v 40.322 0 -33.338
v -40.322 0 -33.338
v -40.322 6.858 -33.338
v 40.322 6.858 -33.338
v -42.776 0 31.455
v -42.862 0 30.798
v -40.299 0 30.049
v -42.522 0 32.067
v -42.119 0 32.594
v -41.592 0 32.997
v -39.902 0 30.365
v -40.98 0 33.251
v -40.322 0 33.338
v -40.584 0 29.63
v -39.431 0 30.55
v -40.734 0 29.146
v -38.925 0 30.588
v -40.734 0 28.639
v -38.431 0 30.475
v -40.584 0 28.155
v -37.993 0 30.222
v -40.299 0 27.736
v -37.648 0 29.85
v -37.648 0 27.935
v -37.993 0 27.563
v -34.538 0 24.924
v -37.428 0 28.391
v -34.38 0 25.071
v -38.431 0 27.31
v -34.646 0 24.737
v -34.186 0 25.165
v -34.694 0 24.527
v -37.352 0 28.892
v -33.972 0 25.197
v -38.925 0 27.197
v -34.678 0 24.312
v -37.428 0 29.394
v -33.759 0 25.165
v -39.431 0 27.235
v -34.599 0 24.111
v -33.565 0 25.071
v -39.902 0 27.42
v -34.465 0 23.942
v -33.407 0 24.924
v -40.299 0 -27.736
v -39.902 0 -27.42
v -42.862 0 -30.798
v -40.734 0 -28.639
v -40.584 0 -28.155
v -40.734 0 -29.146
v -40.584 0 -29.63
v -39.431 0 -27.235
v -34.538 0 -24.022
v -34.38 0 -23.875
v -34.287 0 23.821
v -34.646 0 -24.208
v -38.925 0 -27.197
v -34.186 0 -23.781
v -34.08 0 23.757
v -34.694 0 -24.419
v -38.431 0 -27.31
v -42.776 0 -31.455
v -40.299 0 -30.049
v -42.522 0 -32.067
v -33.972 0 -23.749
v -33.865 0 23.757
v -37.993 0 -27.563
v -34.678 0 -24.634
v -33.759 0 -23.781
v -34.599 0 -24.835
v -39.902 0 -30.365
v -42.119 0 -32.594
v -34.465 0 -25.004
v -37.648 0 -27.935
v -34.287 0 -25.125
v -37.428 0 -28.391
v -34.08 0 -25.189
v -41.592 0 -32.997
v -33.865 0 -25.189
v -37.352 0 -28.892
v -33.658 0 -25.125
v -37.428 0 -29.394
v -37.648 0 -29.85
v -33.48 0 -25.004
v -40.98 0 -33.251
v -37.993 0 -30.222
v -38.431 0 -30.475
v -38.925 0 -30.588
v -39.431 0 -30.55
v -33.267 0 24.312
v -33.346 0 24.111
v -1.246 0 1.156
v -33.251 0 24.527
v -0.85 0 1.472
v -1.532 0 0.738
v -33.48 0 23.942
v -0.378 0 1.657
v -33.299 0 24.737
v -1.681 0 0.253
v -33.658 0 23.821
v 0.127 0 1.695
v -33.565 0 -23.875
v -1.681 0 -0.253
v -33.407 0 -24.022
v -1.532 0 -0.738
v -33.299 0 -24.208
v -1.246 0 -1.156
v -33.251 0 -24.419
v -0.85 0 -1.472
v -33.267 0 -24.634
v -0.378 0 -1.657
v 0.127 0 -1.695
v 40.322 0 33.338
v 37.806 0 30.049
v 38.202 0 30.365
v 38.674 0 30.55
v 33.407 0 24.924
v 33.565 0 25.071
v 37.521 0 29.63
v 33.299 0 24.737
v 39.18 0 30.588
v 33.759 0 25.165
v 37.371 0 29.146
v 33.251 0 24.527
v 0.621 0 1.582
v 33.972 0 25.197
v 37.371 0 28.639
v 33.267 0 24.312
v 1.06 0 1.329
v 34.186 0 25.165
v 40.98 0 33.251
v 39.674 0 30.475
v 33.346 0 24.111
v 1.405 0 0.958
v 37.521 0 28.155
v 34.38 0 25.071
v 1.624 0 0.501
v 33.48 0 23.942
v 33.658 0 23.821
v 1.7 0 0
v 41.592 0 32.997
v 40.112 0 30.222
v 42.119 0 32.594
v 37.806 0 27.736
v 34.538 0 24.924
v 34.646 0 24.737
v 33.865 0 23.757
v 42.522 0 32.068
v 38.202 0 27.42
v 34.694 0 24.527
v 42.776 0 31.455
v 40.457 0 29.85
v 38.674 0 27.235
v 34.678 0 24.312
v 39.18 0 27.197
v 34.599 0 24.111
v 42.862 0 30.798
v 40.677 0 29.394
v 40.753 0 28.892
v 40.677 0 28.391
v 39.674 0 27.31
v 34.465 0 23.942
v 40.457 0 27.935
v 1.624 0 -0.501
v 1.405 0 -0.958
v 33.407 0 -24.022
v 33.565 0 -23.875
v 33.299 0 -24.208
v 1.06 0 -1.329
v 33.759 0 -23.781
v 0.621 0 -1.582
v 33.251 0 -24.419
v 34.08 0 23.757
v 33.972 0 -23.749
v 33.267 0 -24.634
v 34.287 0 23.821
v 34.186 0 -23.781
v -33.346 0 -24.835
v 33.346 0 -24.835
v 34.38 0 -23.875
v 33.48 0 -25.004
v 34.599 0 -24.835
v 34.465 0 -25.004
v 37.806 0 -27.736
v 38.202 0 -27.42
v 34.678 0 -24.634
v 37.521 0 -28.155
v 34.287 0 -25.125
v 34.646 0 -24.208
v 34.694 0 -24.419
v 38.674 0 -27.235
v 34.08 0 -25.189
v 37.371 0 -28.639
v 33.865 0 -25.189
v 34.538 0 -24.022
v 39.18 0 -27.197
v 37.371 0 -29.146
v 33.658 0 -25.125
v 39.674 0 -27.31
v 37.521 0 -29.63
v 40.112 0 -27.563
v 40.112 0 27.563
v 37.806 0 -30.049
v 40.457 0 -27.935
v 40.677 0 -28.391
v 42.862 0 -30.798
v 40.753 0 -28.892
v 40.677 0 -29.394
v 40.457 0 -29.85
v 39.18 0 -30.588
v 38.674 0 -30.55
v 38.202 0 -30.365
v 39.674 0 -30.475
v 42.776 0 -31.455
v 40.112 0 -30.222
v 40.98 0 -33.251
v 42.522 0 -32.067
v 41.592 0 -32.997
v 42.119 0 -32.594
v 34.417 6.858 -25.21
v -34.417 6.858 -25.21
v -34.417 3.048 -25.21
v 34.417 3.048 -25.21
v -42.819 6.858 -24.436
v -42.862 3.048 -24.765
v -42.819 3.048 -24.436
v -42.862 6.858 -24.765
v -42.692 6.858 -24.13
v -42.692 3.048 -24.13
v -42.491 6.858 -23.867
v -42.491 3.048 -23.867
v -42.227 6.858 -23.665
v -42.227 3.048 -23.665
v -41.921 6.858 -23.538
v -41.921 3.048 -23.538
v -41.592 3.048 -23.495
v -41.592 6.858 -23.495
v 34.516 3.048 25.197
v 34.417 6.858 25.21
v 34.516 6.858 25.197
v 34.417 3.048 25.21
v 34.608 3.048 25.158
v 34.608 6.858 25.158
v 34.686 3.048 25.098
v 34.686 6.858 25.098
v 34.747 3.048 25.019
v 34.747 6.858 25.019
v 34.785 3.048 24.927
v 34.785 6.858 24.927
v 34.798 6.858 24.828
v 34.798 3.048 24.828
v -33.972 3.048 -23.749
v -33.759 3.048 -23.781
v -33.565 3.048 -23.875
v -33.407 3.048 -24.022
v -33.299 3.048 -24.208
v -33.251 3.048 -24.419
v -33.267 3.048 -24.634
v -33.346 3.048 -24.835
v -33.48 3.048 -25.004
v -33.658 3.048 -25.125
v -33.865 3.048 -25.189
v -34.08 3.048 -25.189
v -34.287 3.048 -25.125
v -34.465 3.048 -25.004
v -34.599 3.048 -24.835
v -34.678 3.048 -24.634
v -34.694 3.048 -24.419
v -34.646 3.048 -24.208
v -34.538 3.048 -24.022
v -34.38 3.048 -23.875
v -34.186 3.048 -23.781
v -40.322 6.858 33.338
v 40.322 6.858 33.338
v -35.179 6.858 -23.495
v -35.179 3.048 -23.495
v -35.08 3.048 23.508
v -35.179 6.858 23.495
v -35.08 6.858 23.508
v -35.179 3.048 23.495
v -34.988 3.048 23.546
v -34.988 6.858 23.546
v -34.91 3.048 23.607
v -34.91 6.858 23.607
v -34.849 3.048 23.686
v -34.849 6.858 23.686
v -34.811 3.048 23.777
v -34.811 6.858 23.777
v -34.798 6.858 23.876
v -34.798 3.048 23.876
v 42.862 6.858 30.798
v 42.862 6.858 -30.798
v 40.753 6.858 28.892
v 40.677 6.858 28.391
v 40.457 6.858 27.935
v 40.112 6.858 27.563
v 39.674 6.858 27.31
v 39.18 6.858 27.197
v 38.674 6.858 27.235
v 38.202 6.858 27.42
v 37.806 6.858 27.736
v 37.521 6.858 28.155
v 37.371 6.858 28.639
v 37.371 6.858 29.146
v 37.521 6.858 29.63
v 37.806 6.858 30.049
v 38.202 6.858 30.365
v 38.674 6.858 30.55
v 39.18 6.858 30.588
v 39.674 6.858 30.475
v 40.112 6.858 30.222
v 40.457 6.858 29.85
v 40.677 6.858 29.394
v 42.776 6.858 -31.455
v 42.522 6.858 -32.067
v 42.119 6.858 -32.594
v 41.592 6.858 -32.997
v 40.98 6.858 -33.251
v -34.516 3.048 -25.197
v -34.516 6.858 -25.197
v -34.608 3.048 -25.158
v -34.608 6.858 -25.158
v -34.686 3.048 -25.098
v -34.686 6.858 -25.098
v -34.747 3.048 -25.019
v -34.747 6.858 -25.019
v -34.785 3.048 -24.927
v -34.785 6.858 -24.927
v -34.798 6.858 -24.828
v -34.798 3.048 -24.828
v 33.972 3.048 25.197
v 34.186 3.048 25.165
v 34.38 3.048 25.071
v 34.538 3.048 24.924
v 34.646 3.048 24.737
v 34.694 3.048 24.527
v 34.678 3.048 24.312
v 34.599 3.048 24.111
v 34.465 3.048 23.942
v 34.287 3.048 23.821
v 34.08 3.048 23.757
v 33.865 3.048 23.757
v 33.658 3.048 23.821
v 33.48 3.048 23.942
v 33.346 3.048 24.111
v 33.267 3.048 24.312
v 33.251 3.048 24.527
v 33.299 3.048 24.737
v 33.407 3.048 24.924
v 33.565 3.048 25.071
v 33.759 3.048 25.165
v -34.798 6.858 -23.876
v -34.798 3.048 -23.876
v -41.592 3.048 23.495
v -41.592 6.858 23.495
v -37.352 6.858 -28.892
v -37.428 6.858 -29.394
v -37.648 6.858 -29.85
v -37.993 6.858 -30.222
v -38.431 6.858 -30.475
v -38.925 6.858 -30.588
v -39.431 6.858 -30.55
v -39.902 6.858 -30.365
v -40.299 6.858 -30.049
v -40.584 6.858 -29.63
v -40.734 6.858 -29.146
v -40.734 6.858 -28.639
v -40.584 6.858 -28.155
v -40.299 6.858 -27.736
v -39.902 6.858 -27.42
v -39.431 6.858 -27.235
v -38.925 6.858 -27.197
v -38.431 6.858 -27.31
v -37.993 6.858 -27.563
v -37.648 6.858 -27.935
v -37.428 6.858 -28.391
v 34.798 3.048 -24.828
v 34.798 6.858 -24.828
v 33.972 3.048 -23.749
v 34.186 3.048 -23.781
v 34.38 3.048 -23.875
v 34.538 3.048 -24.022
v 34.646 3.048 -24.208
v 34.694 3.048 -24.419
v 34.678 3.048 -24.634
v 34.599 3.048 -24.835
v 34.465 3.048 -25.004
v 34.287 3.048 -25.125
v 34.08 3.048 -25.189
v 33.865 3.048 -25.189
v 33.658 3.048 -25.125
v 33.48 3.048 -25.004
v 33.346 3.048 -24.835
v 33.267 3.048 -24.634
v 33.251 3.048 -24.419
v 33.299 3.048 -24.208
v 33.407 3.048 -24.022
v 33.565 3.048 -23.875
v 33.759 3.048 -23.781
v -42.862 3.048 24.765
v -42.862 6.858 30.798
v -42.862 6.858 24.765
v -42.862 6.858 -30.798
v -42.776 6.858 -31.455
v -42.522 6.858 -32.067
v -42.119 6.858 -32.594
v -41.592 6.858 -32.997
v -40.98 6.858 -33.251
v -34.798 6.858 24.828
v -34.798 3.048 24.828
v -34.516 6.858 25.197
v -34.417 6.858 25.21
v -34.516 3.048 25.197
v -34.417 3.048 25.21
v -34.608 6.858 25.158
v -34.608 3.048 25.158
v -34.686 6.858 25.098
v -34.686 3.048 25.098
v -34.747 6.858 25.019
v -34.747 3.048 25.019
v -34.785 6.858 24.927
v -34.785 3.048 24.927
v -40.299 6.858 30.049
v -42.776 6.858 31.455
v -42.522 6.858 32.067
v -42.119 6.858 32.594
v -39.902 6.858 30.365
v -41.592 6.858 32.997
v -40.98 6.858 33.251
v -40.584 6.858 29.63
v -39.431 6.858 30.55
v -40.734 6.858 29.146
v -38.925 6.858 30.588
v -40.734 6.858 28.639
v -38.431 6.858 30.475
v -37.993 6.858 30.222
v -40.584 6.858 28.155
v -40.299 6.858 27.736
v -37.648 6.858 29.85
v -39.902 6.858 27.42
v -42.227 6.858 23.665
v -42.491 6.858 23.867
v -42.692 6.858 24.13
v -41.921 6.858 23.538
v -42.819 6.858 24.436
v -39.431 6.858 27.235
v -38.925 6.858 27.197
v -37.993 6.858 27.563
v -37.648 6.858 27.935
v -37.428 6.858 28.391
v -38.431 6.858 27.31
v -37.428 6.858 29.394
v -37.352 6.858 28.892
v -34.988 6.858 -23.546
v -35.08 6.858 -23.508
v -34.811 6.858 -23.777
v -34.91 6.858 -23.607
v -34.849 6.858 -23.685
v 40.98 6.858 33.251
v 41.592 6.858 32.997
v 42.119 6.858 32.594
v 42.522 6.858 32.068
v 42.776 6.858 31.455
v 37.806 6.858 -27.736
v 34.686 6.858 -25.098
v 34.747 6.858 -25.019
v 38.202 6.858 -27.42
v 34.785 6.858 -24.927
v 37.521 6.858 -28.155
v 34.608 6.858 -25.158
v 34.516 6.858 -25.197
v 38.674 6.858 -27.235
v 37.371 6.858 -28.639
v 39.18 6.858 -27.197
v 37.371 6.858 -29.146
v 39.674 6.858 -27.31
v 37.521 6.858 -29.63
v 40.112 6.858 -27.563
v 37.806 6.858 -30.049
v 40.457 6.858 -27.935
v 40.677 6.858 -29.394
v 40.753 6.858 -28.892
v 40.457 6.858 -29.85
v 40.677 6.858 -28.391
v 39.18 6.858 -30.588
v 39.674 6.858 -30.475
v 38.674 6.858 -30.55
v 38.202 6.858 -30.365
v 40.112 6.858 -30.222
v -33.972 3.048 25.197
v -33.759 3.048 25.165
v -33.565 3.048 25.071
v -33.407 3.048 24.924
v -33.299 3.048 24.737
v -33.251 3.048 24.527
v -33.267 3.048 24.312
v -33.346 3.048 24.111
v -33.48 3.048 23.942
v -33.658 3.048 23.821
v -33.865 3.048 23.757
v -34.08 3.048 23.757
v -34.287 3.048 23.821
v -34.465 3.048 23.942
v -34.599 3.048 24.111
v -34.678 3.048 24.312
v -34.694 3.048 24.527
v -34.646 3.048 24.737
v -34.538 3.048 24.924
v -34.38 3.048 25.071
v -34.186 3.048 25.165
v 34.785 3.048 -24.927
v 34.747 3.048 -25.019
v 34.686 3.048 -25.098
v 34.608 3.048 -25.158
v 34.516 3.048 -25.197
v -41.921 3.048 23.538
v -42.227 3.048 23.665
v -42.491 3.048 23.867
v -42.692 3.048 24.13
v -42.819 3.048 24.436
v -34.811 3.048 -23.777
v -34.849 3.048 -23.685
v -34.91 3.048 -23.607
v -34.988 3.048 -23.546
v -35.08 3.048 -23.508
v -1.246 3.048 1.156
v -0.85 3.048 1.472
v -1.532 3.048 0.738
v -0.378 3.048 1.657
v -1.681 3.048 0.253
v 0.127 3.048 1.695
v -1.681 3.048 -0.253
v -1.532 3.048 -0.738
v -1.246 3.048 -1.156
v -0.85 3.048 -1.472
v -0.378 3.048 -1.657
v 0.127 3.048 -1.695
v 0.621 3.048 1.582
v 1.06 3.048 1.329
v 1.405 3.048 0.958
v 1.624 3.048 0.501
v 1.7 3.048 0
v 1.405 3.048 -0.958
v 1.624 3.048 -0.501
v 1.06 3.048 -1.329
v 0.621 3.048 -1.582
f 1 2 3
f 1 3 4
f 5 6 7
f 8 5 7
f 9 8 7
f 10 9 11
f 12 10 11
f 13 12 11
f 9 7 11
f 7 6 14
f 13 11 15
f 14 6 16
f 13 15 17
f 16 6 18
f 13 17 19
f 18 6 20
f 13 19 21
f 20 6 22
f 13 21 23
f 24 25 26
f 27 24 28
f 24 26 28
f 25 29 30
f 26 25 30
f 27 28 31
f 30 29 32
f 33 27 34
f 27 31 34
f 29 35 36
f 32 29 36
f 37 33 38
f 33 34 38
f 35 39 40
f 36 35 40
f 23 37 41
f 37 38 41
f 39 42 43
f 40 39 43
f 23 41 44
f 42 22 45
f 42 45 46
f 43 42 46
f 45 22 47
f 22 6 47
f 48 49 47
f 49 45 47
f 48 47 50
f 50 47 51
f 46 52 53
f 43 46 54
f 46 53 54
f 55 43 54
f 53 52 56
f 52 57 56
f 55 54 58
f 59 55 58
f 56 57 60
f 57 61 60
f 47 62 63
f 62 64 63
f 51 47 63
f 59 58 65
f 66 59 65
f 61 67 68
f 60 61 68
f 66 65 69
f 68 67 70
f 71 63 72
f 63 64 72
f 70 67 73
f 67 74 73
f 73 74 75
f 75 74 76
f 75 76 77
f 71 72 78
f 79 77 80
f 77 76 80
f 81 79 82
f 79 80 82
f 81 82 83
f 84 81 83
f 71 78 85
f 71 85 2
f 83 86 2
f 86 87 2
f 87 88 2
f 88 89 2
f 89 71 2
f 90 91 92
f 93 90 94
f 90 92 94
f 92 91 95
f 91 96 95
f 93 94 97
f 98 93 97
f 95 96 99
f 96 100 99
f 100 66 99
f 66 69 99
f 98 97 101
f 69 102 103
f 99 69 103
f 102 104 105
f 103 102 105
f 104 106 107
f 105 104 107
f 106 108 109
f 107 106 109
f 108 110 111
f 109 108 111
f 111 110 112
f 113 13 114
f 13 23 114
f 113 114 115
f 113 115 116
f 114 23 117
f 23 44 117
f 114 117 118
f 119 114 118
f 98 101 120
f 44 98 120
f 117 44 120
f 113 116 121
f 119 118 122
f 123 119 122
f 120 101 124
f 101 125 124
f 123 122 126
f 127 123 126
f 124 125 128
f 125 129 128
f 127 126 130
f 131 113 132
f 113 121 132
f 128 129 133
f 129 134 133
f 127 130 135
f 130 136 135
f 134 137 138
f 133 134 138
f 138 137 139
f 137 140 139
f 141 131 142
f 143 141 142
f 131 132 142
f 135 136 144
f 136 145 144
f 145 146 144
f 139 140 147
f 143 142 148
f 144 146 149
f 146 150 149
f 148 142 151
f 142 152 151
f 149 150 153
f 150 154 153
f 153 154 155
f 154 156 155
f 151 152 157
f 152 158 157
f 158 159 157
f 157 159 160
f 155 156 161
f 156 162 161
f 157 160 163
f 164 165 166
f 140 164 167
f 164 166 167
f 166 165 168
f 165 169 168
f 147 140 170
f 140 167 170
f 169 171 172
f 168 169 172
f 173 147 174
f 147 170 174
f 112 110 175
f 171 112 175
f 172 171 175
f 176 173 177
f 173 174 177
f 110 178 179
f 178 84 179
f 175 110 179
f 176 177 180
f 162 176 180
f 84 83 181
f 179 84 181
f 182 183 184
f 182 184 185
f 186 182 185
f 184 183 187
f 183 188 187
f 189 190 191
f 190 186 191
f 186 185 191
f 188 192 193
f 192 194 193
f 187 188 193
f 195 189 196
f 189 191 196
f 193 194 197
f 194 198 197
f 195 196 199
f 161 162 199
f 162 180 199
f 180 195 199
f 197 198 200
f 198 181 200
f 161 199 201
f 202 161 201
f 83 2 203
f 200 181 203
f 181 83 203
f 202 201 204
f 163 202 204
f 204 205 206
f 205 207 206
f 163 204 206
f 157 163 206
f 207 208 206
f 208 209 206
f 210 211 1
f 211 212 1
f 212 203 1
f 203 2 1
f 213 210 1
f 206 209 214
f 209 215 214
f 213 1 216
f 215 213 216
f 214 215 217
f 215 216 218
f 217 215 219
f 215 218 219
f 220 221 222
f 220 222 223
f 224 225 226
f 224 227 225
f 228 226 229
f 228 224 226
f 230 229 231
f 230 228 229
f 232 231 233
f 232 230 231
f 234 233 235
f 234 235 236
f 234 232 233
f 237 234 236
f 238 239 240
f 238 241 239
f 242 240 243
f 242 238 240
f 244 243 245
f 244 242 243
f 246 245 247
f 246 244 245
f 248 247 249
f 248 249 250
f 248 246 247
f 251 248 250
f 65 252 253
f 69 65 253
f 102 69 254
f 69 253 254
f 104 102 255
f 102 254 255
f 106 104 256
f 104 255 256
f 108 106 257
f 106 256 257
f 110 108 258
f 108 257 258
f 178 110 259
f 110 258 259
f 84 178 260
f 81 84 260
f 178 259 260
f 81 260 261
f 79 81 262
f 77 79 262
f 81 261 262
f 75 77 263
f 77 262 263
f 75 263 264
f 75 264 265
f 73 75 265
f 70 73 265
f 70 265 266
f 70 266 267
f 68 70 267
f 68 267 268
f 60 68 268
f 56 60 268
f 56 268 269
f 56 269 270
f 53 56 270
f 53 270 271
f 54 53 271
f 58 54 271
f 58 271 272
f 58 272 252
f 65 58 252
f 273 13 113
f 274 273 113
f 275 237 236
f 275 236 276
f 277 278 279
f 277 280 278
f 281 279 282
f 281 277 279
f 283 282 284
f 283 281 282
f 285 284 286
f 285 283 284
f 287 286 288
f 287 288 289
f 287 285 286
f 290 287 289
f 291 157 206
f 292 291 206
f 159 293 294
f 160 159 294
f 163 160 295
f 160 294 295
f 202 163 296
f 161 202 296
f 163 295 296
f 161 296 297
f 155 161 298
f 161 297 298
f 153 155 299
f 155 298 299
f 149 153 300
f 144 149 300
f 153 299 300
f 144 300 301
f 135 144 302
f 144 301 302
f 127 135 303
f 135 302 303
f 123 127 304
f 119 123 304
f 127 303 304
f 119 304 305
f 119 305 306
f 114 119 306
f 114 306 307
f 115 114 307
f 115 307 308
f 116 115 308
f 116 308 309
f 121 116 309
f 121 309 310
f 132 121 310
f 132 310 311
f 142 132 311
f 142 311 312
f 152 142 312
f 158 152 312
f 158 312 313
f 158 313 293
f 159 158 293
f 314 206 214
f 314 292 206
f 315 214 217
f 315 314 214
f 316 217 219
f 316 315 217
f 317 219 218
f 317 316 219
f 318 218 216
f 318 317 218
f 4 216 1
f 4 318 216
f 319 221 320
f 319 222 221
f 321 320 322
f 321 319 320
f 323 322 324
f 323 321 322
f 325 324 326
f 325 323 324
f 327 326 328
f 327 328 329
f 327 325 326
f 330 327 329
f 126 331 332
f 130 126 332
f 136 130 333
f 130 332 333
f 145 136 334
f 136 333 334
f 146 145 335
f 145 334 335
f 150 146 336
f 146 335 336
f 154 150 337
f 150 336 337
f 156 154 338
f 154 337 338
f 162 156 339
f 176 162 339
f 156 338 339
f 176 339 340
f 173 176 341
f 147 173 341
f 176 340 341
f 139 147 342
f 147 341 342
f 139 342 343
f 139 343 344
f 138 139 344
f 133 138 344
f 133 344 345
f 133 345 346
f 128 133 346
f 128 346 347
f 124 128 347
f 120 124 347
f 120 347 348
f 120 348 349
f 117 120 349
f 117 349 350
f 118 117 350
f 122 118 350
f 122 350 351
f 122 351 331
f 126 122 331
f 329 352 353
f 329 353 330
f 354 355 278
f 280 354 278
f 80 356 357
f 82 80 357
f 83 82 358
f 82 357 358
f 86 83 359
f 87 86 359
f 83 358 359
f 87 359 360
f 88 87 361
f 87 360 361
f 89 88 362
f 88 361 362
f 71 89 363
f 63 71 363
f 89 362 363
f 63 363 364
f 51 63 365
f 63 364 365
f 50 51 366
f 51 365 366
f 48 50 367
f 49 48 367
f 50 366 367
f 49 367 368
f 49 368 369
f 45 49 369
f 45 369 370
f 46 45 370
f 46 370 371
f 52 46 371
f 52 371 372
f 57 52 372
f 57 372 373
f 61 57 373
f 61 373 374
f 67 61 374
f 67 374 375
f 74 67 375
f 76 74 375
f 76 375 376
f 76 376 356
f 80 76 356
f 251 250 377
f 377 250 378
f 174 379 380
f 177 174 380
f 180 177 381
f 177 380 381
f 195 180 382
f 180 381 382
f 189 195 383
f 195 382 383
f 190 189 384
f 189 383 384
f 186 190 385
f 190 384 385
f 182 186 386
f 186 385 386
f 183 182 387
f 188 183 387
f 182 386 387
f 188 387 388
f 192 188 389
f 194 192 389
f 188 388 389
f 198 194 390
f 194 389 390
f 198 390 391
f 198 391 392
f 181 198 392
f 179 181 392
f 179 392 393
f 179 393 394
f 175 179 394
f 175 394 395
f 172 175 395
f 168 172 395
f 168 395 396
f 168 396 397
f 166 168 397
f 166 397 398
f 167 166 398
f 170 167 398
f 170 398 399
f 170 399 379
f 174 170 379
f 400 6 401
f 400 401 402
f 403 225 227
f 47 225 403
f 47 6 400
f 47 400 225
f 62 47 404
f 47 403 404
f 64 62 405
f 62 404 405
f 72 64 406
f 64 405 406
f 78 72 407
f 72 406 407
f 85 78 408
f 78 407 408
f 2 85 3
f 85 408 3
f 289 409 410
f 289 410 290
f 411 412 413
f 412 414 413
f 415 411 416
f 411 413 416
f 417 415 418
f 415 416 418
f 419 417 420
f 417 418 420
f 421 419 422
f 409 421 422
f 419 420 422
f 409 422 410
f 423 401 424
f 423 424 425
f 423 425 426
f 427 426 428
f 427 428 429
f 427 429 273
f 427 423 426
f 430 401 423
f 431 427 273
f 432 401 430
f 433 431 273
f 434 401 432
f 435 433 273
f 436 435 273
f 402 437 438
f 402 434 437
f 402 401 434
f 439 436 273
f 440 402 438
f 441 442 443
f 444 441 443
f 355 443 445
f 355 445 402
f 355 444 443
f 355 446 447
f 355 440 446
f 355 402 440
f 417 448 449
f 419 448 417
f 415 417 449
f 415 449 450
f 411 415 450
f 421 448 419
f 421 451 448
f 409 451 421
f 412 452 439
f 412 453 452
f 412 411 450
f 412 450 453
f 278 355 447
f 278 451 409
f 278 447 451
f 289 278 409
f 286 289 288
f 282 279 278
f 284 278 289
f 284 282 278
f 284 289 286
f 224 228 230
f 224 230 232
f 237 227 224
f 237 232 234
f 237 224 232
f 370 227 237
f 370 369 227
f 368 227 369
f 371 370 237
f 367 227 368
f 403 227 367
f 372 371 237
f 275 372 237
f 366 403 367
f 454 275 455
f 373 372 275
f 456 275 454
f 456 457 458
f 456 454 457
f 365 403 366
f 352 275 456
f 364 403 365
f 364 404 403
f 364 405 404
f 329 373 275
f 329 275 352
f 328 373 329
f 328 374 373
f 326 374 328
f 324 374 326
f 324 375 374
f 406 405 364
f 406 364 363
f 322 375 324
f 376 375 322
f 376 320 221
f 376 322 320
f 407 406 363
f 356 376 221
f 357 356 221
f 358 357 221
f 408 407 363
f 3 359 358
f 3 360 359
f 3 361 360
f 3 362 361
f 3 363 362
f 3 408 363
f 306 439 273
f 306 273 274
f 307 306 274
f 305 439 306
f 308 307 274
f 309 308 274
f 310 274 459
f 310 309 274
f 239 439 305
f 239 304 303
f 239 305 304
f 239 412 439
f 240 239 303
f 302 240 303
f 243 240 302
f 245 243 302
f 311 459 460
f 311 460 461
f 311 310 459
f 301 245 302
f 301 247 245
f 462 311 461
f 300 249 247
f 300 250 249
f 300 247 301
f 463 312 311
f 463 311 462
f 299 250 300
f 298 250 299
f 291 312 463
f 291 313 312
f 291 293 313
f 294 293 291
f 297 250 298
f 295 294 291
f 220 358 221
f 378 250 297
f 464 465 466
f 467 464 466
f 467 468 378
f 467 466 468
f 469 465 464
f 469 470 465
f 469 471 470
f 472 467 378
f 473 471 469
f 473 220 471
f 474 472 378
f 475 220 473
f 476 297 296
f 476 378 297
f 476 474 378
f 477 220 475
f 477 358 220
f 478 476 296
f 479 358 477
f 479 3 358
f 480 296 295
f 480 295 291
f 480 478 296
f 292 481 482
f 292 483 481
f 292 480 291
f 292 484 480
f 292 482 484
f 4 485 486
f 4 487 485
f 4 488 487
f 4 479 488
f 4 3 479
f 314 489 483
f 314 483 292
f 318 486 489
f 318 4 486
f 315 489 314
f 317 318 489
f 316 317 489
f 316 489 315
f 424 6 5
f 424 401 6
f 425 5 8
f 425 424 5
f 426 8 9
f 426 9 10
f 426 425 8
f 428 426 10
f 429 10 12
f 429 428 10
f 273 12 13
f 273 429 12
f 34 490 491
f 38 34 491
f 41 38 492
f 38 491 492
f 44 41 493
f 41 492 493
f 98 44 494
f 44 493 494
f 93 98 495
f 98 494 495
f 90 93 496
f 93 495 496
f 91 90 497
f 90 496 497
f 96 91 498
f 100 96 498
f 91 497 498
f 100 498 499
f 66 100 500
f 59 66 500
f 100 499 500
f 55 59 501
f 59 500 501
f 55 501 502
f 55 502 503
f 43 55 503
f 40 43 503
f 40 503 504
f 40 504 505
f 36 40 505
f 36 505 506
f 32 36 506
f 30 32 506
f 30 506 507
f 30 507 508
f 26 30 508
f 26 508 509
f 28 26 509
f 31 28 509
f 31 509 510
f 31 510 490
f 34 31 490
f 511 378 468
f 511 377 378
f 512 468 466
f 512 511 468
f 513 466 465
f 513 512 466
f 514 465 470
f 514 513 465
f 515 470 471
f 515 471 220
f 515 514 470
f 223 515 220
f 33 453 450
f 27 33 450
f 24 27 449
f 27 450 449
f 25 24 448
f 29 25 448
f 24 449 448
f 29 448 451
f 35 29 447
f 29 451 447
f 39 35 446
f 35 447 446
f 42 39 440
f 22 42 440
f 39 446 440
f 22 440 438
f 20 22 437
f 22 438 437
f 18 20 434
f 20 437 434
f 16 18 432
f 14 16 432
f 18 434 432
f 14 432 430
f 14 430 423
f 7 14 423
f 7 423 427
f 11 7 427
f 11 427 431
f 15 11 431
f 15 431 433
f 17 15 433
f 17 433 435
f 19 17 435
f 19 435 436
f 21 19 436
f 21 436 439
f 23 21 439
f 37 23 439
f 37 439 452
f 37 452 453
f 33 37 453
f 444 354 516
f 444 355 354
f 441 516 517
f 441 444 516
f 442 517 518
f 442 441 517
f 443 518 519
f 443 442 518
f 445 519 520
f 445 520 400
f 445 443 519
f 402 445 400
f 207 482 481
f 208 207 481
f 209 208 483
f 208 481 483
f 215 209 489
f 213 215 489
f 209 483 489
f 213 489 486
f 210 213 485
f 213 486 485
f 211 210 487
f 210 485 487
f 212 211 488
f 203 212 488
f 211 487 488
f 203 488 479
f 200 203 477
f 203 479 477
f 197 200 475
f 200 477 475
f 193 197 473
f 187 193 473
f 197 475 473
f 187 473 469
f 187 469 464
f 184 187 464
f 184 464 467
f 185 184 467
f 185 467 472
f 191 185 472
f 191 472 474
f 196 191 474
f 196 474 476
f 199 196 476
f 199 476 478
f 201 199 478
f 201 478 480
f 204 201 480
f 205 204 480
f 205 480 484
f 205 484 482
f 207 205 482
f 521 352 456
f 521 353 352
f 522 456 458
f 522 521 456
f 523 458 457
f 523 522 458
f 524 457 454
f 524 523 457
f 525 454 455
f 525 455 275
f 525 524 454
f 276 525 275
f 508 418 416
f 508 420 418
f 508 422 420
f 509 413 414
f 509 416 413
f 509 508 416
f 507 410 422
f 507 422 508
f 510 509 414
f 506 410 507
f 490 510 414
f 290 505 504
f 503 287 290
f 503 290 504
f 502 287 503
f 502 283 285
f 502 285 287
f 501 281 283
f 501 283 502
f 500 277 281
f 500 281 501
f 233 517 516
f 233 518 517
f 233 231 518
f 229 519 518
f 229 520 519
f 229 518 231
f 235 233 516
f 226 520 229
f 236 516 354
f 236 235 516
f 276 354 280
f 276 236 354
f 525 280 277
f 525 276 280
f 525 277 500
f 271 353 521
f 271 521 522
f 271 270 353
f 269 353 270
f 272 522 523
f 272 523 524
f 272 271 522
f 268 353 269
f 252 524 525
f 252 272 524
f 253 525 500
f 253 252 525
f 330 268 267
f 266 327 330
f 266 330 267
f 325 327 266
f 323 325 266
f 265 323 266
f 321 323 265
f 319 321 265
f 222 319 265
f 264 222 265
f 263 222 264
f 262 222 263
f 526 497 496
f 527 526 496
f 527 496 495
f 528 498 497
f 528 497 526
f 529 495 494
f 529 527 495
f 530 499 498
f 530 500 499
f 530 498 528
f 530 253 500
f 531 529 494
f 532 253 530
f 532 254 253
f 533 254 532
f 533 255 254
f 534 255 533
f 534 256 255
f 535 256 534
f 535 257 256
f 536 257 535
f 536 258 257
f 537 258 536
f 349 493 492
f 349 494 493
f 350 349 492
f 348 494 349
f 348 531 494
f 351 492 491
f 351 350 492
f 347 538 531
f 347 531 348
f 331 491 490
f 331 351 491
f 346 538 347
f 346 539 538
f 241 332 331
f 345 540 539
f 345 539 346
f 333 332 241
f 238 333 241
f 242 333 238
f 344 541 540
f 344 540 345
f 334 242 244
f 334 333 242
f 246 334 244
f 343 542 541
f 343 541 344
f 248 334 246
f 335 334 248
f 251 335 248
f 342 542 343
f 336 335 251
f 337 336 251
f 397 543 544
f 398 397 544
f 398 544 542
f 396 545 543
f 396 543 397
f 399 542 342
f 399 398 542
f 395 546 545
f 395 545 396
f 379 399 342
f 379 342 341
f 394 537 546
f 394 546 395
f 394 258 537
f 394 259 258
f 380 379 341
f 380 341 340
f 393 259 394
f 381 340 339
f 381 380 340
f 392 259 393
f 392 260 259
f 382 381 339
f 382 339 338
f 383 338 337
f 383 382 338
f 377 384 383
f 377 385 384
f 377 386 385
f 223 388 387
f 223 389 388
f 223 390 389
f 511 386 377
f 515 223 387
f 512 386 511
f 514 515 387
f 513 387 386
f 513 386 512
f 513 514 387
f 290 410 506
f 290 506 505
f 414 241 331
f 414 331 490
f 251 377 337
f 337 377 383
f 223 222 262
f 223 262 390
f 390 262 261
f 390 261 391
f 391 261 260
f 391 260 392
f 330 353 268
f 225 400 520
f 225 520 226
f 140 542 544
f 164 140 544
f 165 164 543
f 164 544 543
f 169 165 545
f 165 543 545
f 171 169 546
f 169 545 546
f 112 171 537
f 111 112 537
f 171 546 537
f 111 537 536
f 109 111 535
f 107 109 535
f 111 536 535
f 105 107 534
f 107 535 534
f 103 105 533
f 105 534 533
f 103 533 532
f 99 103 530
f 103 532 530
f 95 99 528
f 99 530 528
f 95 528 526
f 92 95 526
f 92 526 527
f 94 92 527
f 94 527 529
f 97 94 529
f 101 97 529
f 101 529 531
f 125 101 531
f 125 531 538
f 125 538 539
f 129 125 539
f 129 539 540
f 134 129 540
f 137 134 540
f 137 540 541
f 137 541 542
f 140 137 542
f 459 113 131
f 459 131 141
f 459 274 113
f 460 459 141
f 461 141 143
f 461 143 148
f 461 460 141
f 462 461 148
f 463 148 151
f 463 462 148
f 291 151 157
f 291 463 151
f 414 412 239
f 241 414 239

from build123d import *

# Parameters (mm, degrees)
SKETCH1_W                = 85.725
SKETCH1_H                = 66.675
BOSS_EXTRUDE1_DEPTH      = 6.858
FILLET1_R                = 2.54
SKETCH2_W                = 69.596
SKETCH2_H                = 50.419
CUT_EXTRUDE1_DEPTH       = 3.81
FILLET2_R                = 0.381
SKETCH3_R                = 0.7239
CUT_EXTRUDE2_DEPTH       = 3.556
M3_CLEARANCE_HOLE1_D     = 3.4
M3_CLEARANCE_HOLE1_DEPTH = 6.858
SKETCH6_W                = 46.393114838
SKETCH6_H                = 46.99
CUT_EXTRUDE3_DEPTH       = 3.81
FILLET3_R                = 0.381
FILLET4_R                = 1.27


with BuildPart() as part:
    # Sketch1 → Boss-Extrude1 (new body)
    with BuildSketch(Plane(origin=(0, 0, 0), x_dir=(1, 0, 0), z_dir=(0, 1, 0))):
        Rectangle(SKETCH1_W, SKETCH1_H)
    extrude(amount=BOSS_EXTRUDE1_DEPTH)

    # Fillet1
    fillet1_edges = [part.edges().sort_by_distance(p)[0] for p in [
        (42.8625, 3.429, 33.3375),
        (-42.8625, 3.429, 33.3375),
        (-42.8625, 3.429, -33.3375),
        (42.8625, 3.429, -33.3375),
    ]]
    fillet(fillet1_edges, radius=FILLET1_R)

    # Sketch2 → Cut-Extrude1 (cut)
    with BuildSketch(Plane(origin=(0, 6.858, 0), x_dir=(1, 0, 0), z_dir=(0, 1, 0))):
        Rectangle(SKETCH2_W, SKETCH2_H)
    extrude(amount=-CUT_EXTRUDE1_DEPTH, mode=Mode.SUBTRACT)

    # Fillet2
    fillet2_edges = [part.edges().sort_by_distance(p)[0] for p in [
        (-34.798, 4.953, 25.2095),
        (-34.798, 4.953, -25.2095),
        (34.798, 4.953, -25.2095),
        (34.798, 4.953, 25.2095),
    ]]
    fillet(fillet2_edges, radius=FILLET2_R)

    # Sketch3 → Cut-Extrude2 (cut)
    with BuildSketch(Plane(origin=(0, 3.048, 0), x_dir=(1, 0, 0), z_dir=(0, 1, 0))):
        with Locations(Location((-33.9725, 24.4729, 0), (0, 0, 270))):
            Circle(SKETCH3_R)
        with Locations(Location((33.9725, 24.4729, 0), (0, 0, 270))):
            Circle(SKETCH3_R)
        with Locations(Location((33.9725, -24.4729, 0), (0, 0, 270))):
            Circle(SKETCH3_R)
        with Locations(Location((-33.9725, -24.4729, 0), (0, 0, 270))):
            Circle(SKETCH3_R)
    extrude(amount=-CUT_EXTRUDE2_DEPTH, mode=Mode.SUBTRACT)

    # M3 Clearance Hole1
    with Locations(Plane(origin=(0, 0, 0), x_dir=(-1, 0, 0), z_dir=(0, -1, 0))):
        with Locations((-39.0525, 28.8925), (0, 0), (39.0525, 28.8925), (-39.0525, -28.8925), (39.0525, -28.8925)):
            Hole(M3_CLEARANCE_HOLE1_D / 2, depth=M3_CLEARANCE_HOLE1_DEPTH)

    # Sketch6 → Cut-Extrude3 (cut)
    with BuildSketch(Plane(origin=(0, 6.858, 0), x_dir=(1, 0, 0), z_dir=(0, 1, 0))):
        with Locations((-42.86502452, 0)):
            Rectangle(SKETCH6_W, SKETCH6_H)
    extrude(amount=-CUT_EXTRUDE3_DEPTH, mode=Mode.SUBTRACT)

    # Fillet3
    fillet3_edges = [part.edges().sort_by_distance(p)[0] for p in [
        (-34.798, 4.953, -23.495),
        (-34.798, 4.953, 23.495),
    ]]
    fillet(fillet3_edges, radius=FILLET3_R)

    # Fillet4
    fillet4_edges = [part.edges().sort_by_distance(p)[0] for p in [
        (-42.8625, 4.953, -23.495),
        (-42.8625, 4.953, 23.495),
    ]]
    fillet(fillet4_edges, radius=FILLET4_R)


solid = part.part
